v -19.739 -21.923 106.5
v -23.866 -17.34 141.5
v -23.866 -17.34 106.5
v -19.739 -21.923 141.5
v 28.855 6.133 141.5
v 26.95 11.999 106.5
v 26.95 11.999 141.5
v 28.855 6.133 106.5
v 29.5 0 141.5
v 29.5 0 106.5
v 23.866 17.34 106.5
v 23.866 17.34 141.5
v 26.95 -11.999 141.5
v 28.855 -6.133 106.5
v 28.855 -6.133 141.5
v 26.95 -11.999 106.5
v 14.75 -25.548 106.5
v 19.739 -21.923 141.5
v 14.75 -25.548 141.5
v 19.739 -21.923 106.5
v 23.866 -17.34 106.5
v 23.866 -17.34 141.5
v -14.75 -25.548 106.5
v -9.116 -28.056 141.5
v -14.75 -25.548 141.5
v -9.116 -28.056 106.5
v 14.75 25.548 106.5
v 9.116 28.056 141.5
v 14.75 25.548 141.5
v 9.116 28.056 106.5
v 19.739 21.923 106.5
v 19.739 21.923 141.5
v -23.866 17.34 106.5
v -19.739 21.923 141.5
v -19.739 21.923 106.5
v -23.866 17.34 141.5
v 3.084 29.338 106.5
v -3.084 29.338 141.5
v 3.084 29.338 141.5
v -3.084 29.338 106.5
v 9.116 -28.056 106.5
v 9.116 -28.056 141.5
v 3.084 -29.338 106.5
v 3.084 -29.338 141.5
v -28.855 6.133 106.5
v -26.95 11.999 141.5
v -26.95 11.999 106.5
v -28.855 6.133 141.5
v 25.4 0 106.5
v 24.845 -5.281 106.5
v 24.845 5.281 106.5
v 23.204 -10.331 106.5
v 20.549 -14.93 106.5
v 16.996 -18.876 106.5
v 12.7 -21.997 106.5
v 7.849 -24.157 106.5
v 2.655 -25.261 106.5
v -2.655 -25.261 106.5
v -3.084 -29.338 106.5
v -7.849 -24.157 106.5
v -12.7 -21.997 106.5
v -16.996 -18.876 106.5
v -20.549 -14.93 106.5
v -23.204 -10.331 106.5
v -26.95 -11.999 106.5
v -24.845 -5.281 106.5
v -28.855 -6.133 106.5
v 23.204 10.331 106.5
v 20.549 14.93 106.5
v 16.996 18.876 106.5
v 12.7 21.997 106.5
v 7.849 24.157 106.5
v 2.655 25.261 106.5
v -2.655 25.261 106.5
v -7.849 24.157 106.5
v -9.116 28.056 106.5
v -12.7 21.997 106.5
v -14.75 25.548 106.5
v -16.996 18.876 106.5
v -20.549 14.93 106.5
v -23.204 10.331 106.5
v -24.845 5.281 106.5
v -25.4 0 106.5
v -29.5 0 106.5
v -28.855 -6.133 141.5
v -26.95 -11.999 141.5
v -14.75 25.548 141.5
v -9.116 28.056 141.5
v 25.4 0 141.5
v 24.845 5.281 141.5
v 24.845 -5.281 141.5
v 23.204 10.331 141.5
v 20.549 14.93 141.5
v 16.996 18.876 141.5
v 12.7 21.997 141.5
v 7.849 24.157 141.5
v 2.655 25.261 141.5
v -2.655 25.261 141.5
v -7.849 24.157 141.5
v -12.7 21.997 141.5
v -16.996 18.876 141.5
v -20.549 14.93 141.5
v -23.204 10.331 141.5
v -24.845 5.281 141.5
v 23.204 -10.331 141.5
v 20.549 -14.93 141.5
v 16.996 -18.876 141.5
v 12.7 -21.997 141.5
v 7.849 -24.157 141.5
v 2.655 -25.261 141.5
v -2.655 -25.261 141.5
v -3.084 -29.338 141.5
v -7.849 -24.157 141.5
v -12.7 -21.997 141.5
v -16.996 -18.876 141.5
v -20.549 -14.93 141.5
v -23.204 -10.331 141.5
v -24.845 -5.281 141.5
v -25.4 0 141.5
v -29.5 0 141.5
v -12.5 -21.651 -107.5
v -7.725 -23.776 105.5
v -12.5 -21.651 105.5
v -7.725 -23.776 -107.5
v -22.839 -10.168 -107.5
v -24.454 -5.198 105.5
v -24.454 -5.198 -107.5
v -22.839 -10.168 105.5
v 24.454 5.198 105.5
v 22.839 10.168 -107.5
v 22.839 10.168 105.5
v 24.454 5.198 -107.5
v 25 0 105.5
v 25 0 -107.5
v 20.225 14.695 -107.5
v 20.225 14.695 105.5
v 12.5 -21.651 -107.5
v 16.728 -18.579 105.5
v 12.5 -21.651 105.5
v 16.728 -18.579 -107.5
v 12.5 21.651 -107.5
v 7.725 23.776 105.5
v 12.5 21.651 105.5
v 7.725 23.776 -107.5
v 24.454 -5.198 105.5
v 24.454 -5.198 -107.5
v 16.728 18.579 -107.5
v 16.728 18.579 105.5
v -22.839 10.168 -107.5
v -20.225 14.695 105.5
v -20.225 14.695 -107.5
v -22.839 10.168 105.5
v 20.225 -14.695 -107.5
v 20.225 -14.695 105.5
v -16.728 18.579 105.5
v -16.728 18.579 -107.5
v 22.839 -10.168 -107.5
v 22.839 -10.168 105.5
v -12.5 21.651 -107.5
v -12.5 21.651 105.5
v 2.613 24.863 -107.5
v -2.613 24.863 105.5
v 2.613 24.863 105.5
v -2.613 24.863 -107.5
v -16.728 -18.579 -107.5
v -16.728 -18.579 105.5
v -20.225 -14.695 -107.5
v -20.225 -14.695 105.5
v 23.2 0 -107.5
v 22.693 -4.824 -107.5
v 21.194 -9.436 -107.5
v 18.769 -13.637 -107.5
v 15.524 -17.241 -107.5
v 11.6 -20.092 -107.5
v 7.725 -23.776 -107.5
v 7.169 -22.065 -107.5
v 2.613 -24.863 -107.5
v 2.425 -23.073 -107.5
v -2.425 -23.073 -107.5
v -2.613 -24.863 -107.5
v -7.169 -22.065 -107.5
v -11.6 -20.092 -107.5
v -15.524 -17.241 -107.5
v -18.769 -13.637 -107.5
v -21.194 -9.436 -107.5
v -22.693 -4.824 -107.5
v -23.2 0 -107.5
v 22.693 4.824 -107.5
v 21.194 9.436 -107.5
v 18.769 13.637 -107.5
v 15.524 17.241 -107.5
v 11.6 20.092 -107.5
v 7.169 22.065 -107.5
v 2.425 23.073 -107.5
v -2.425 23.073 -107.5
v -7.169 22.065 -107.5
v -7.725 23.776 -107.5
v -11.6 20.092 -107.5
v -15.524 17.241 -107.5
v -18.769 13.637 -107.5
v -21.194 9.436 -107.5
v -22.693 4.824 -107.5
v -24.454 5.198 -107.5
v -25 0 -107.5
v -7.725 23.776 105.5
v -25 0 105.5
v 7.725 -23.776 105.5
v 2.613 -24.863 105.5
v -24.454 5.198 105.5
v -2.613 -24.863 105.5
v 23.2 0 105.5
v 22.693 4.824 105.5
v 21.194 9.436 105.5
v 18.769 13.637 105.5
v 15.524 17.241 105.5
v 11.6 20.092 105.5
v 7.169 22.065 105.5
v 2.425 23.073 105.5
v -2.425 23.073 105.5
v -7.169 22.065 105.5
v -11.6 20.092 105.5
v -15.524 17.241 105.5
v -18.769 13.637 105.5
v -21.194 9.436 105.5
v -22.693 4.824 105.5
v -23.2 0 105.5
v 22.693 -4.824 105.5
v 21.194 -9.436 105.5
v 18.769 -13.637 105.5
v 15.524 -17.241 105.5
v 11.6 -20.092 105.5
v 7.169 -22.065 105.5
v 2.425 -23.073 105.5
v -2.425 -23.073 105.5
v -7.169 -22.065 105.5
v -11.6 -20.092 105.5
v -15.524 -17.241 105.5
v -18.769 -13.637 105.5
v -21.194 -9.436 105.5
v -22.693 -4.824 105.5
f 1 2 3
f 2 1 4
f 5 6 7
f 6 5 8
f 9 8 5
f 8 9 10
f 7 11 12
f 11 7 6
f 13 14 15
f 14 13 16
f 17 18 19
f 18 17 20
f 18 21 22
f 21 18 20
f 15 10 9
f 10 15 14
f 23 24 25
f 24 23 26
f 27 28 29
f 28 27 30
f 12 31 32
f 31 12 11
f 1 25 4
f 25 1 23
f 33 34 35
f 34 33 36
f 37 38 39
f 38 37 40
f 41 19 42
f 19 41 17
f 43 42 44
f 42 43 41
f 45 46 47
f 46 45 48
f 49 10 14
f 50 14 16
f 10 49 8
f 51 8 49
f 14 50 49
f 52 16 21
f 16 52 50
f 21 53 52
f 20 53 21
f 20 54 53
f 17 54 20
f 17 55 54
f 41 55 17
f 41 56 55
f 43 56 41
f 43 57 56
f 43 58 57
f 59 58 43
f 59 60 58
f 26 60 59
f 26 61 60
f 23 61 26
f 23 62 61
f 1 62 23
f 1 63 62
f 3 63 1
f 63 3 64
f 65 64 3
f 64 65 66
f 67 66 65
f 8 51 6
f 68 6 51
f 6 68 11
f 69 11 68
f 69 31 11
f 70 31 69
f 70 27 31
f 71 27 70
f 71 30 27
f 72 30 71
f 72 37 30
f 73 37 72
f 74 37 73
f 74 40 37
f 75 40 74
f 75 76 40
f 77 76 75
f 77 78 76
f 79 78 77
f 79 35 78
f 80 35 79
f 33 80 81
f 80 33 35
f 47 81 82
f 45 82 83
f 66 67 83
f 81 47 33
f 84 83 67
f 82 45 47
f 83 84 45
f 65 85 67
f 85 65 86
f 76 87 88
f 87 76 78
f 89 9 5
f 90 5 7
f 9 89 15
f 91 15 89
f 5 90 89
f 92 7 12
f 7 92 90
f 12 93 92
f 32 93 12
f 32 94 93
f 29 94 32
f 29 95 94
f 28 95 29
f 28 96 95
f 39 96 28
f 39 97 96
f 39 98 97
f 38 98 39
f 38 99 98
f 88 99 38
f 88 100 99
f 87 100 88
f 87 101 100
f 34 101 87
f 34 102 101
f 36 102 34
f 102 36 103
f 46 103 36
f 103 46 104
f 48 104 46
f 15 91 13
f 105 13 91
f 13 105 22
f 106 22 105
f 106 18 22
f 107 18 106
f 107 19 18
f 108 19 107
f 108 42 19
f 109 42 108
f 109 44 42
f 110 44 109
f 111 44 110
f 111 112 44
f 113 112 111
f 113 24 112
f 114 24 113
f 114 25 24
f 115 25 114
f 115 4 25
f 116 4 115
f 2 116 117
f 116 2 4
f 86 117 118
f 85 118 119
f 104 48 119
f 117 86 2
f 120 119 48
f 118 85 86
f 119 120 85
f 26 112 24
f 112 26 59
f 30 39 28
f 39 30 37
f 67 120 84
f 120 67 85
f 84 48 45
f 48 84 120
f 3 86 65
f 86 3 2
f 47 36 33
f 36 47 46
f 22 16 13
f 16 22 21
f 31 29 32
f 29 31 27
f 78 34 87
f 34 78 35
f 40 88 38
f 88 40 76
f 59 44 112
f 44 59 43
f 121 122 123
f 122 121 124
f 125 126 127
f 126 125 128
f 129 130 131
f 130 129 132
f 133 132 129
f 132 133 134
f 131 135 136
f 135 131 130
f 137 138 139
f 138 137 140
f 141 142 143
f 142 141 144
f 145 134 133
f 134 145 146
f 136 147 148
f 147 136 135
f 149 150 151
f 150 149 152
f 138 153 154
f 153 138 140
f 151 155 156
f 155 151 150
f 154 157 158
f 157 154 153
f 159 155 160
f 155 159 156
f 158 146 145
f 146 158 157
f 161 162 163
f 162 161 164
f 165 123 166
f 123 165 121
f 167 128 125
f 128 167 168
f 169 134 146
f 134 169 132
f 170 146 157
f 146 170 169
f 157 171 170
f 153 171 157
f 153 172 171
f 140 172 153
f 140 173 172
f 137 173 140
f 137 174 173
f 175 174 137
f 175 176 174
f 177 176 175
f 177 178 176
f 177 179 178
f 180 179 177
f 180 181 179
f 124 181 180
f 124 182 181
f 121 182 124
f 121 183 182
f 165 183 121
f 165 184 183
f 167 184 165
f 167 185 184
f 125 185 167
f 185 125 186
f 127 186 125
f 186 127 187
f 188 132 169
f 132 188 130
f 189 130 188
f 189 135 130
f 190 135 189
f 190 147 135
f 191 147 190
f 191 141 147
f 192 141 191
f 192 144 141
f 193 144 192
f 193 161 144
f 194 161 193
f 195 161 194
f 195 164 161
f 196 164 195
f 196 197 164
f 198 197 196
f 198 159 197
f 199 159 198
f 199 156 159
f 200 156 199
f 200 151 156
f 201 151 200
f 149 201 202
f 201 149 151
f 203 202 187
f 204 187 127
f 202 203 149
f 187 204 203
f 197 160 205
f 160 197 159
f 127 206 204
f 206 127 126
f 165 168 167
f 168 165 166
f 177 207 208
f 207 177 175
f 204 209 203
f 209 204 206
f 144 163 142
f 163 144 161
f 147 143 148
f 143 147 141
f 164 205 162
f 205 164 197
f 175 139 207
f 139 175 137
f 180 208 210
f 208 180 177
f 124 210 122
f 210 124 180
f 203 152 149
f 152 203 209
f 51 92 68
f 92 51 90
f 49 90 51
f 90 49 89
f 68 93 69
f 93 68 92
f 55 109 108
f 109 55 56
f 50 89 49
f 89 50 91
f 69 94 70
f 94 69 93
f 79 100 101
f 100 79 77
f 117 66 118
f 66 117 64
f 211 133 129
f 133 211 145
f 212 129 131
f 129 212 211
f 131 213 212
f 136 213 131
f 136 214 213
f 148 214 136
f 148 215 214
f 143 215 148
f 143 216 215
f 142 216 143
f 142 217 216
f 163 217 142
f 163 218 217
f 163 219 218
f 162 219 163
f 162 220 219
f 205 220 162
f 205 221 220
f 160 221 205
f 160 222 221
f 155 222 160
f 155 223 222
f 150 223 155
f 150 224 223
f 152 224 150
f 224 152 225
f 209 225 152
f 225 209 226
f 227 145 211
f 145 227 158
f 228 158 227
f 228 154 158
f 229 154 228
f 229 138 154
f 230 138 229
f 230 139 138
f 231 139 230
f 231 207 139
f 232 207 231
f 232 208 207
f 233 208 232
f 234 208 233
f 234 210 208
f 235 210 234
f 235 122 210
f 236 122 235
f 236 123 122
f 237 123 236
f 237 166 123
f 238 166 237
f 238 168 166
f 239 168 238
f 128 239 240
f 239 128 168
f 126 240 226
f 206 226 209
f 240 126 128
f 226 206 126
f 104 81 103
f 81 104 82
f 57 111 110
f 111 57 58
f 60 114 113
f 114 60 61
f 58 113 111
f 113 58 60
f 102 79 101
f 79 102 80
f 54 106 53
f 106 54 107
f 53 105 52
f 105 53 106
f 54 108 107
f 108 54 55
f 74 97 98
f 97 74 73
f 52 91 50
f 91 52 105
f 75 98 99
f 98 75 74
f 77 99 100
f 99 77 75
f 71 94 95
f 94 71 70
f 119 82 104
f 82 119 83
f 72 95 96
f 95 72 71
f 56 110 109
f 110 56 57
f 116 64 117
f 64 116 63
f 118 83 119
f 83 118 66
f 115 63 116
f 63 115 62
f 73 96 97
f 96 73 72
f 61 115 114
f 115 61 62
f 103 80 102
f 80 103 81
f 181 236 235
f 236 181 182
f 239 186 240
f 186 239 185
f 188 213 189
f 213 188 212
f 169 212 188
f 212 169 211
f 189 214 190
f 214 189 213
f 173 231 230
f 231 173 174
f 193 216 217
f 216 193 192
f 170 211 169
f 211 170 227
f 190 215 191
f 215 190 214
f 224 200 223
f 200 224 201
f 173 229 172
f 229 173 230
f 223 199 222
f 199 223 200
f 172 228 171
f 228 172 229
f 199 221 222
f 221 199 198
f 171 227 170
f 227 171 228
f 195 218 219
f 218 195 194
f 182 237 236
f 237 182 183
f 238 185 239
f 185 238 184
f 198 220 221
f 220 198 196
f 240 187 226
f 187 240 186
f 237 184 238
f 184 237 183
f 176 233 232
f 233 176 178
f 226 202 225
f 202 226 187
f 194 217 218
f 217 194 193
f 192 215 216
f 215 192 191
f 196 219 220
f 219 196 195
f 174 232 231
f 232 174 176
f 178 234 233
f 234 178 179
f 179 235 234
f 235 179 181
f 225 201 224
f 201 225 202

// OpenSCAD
// Parameters
pipe_standard = 1; //[1:1:1]
nominal_diameter = 50; //[25:100:1]
length_mm = 250; //[125:500:1]
end_fitting = 1; //[0:1:1]
overlap_mm = 1; //[0.5:2:0.1]
ht50_outer_diameter = 50; //[45:60:0.1]
ht50_wall_thickness = 1.8; //[1:3.6:0.1]
fitting_length = 35; //[20:70:1]
fitting_od_factor = 1.18; //[1.05:1.4:0.01]
fitting_wall_extra = 1.2; //[0.5:3:0.1]
socket_clearance = 0.4; //[0.1:1:0.05]
stop_ring_thickness = 2; //[1:5:0.1]
stop_ring_depth = 2; //[1:6:0.1]

// HT Pipe - fixed connectivity (no floating caps, all in one union with overlap)
module ht_pipe() {
  color([0.85, 0.85, 0.8]) {

    // Derived dimensions
    main_h = length_mm - (end_fitting * fitting_length);   // straight pipe length
    fit_h  = end_fitting * fitting_length;

    // Place main pipe centered at Z=0
    main_z = 0;

    // Attach fitting to TOP end of main pipe with guaranteed overlap
    // main top face at +main_h/2
    // fitting bottom face at (fit_z - fit_h/2)
    // enforce: (fit_z - fit_h/2) = main_h/2 - overlap_mm  => fit_z = main_h/2 + fit_h/2 - overlap_mm
    fit_z = (main_h/2) + (fit_h/2) - overlap_mm;

    union() {

      // --- SOLID GEOMETRY (outer shells + stop ring) ---
      difference() {
        union() {
          // Main outer pipe
          translate([0, 0, main_z])
            cylinder(r=ht50_outer_diameter/2, h=main_h, center=true);

          // Integrated end fitting outer shell (attached, overlapping)
          if (end_fitting == 1) {
            translate([0, 0, fit_z])
              cylinder(r=(ht50_outer_diameter * fitting_od_factor) / 2, h=fit_h, center=true);

            // Stop ring near the top end of the fitting (still part of the solid)
            // Position so it stays within the fitting and remains connected
            stop_z = fit_z + (fit_h/2) - (stop_ring_thickness/2) - overlap_mm;
            translate([0, 0, stop_z])
              cylinder(r=(ht50_outer_diameter + 2 * socket_clearance) / 2,
                       h=stop_ring_thickness, center=true);
          }
        }

        // --- VOIDS (subtract once so everything stays a single connected solid) ---

        // Main inner void (slightly longer for clean subtraction)
        translate([0, 0, main_z])
          cylinder(r=(ht50_outer_diameter - 2 * ht50_wall_thickness) / 2,
                   h=main_h + 2 * overlap_mm, center=true);

        if (end_fitting == 1) {
          // Socket void inside fitting (slightly longer)
          translate([0, 0, fit_z])
            cylinder(r=(ht50_outer_diameter + 2 * socket_clearance) / 2,
                     h=fit_h + 2 * overlap_mm, center=true);

          // Through-bore void (keeps continuity with main inner diameter)
          translate([0, 0, fit_z])
            cylinder(r=(ht50_outer_diameter - 2 * ht50_wall_thickness) / 2,
                     h=fit_h + 2 * overlap_mm, center=true);

          // Stop ring inner relief (creates the ring)
          stop_z = fit_z + (fit_h/2) - (stop_ring_thickness/2) - overlap_mm;
          translate([0, 0, stop_z])
            cylinder(r=((ht50_outer_diameter + 2 * socket_clearance) - 2 * stop_ring_depth) / 2,
                     h=stop_ring_thickness + 2 * overlap_mm, center=true);
        }
      }
    }
  }
}

// Assembly
module assembly() {
  ht_pipe();
}

assembly();
